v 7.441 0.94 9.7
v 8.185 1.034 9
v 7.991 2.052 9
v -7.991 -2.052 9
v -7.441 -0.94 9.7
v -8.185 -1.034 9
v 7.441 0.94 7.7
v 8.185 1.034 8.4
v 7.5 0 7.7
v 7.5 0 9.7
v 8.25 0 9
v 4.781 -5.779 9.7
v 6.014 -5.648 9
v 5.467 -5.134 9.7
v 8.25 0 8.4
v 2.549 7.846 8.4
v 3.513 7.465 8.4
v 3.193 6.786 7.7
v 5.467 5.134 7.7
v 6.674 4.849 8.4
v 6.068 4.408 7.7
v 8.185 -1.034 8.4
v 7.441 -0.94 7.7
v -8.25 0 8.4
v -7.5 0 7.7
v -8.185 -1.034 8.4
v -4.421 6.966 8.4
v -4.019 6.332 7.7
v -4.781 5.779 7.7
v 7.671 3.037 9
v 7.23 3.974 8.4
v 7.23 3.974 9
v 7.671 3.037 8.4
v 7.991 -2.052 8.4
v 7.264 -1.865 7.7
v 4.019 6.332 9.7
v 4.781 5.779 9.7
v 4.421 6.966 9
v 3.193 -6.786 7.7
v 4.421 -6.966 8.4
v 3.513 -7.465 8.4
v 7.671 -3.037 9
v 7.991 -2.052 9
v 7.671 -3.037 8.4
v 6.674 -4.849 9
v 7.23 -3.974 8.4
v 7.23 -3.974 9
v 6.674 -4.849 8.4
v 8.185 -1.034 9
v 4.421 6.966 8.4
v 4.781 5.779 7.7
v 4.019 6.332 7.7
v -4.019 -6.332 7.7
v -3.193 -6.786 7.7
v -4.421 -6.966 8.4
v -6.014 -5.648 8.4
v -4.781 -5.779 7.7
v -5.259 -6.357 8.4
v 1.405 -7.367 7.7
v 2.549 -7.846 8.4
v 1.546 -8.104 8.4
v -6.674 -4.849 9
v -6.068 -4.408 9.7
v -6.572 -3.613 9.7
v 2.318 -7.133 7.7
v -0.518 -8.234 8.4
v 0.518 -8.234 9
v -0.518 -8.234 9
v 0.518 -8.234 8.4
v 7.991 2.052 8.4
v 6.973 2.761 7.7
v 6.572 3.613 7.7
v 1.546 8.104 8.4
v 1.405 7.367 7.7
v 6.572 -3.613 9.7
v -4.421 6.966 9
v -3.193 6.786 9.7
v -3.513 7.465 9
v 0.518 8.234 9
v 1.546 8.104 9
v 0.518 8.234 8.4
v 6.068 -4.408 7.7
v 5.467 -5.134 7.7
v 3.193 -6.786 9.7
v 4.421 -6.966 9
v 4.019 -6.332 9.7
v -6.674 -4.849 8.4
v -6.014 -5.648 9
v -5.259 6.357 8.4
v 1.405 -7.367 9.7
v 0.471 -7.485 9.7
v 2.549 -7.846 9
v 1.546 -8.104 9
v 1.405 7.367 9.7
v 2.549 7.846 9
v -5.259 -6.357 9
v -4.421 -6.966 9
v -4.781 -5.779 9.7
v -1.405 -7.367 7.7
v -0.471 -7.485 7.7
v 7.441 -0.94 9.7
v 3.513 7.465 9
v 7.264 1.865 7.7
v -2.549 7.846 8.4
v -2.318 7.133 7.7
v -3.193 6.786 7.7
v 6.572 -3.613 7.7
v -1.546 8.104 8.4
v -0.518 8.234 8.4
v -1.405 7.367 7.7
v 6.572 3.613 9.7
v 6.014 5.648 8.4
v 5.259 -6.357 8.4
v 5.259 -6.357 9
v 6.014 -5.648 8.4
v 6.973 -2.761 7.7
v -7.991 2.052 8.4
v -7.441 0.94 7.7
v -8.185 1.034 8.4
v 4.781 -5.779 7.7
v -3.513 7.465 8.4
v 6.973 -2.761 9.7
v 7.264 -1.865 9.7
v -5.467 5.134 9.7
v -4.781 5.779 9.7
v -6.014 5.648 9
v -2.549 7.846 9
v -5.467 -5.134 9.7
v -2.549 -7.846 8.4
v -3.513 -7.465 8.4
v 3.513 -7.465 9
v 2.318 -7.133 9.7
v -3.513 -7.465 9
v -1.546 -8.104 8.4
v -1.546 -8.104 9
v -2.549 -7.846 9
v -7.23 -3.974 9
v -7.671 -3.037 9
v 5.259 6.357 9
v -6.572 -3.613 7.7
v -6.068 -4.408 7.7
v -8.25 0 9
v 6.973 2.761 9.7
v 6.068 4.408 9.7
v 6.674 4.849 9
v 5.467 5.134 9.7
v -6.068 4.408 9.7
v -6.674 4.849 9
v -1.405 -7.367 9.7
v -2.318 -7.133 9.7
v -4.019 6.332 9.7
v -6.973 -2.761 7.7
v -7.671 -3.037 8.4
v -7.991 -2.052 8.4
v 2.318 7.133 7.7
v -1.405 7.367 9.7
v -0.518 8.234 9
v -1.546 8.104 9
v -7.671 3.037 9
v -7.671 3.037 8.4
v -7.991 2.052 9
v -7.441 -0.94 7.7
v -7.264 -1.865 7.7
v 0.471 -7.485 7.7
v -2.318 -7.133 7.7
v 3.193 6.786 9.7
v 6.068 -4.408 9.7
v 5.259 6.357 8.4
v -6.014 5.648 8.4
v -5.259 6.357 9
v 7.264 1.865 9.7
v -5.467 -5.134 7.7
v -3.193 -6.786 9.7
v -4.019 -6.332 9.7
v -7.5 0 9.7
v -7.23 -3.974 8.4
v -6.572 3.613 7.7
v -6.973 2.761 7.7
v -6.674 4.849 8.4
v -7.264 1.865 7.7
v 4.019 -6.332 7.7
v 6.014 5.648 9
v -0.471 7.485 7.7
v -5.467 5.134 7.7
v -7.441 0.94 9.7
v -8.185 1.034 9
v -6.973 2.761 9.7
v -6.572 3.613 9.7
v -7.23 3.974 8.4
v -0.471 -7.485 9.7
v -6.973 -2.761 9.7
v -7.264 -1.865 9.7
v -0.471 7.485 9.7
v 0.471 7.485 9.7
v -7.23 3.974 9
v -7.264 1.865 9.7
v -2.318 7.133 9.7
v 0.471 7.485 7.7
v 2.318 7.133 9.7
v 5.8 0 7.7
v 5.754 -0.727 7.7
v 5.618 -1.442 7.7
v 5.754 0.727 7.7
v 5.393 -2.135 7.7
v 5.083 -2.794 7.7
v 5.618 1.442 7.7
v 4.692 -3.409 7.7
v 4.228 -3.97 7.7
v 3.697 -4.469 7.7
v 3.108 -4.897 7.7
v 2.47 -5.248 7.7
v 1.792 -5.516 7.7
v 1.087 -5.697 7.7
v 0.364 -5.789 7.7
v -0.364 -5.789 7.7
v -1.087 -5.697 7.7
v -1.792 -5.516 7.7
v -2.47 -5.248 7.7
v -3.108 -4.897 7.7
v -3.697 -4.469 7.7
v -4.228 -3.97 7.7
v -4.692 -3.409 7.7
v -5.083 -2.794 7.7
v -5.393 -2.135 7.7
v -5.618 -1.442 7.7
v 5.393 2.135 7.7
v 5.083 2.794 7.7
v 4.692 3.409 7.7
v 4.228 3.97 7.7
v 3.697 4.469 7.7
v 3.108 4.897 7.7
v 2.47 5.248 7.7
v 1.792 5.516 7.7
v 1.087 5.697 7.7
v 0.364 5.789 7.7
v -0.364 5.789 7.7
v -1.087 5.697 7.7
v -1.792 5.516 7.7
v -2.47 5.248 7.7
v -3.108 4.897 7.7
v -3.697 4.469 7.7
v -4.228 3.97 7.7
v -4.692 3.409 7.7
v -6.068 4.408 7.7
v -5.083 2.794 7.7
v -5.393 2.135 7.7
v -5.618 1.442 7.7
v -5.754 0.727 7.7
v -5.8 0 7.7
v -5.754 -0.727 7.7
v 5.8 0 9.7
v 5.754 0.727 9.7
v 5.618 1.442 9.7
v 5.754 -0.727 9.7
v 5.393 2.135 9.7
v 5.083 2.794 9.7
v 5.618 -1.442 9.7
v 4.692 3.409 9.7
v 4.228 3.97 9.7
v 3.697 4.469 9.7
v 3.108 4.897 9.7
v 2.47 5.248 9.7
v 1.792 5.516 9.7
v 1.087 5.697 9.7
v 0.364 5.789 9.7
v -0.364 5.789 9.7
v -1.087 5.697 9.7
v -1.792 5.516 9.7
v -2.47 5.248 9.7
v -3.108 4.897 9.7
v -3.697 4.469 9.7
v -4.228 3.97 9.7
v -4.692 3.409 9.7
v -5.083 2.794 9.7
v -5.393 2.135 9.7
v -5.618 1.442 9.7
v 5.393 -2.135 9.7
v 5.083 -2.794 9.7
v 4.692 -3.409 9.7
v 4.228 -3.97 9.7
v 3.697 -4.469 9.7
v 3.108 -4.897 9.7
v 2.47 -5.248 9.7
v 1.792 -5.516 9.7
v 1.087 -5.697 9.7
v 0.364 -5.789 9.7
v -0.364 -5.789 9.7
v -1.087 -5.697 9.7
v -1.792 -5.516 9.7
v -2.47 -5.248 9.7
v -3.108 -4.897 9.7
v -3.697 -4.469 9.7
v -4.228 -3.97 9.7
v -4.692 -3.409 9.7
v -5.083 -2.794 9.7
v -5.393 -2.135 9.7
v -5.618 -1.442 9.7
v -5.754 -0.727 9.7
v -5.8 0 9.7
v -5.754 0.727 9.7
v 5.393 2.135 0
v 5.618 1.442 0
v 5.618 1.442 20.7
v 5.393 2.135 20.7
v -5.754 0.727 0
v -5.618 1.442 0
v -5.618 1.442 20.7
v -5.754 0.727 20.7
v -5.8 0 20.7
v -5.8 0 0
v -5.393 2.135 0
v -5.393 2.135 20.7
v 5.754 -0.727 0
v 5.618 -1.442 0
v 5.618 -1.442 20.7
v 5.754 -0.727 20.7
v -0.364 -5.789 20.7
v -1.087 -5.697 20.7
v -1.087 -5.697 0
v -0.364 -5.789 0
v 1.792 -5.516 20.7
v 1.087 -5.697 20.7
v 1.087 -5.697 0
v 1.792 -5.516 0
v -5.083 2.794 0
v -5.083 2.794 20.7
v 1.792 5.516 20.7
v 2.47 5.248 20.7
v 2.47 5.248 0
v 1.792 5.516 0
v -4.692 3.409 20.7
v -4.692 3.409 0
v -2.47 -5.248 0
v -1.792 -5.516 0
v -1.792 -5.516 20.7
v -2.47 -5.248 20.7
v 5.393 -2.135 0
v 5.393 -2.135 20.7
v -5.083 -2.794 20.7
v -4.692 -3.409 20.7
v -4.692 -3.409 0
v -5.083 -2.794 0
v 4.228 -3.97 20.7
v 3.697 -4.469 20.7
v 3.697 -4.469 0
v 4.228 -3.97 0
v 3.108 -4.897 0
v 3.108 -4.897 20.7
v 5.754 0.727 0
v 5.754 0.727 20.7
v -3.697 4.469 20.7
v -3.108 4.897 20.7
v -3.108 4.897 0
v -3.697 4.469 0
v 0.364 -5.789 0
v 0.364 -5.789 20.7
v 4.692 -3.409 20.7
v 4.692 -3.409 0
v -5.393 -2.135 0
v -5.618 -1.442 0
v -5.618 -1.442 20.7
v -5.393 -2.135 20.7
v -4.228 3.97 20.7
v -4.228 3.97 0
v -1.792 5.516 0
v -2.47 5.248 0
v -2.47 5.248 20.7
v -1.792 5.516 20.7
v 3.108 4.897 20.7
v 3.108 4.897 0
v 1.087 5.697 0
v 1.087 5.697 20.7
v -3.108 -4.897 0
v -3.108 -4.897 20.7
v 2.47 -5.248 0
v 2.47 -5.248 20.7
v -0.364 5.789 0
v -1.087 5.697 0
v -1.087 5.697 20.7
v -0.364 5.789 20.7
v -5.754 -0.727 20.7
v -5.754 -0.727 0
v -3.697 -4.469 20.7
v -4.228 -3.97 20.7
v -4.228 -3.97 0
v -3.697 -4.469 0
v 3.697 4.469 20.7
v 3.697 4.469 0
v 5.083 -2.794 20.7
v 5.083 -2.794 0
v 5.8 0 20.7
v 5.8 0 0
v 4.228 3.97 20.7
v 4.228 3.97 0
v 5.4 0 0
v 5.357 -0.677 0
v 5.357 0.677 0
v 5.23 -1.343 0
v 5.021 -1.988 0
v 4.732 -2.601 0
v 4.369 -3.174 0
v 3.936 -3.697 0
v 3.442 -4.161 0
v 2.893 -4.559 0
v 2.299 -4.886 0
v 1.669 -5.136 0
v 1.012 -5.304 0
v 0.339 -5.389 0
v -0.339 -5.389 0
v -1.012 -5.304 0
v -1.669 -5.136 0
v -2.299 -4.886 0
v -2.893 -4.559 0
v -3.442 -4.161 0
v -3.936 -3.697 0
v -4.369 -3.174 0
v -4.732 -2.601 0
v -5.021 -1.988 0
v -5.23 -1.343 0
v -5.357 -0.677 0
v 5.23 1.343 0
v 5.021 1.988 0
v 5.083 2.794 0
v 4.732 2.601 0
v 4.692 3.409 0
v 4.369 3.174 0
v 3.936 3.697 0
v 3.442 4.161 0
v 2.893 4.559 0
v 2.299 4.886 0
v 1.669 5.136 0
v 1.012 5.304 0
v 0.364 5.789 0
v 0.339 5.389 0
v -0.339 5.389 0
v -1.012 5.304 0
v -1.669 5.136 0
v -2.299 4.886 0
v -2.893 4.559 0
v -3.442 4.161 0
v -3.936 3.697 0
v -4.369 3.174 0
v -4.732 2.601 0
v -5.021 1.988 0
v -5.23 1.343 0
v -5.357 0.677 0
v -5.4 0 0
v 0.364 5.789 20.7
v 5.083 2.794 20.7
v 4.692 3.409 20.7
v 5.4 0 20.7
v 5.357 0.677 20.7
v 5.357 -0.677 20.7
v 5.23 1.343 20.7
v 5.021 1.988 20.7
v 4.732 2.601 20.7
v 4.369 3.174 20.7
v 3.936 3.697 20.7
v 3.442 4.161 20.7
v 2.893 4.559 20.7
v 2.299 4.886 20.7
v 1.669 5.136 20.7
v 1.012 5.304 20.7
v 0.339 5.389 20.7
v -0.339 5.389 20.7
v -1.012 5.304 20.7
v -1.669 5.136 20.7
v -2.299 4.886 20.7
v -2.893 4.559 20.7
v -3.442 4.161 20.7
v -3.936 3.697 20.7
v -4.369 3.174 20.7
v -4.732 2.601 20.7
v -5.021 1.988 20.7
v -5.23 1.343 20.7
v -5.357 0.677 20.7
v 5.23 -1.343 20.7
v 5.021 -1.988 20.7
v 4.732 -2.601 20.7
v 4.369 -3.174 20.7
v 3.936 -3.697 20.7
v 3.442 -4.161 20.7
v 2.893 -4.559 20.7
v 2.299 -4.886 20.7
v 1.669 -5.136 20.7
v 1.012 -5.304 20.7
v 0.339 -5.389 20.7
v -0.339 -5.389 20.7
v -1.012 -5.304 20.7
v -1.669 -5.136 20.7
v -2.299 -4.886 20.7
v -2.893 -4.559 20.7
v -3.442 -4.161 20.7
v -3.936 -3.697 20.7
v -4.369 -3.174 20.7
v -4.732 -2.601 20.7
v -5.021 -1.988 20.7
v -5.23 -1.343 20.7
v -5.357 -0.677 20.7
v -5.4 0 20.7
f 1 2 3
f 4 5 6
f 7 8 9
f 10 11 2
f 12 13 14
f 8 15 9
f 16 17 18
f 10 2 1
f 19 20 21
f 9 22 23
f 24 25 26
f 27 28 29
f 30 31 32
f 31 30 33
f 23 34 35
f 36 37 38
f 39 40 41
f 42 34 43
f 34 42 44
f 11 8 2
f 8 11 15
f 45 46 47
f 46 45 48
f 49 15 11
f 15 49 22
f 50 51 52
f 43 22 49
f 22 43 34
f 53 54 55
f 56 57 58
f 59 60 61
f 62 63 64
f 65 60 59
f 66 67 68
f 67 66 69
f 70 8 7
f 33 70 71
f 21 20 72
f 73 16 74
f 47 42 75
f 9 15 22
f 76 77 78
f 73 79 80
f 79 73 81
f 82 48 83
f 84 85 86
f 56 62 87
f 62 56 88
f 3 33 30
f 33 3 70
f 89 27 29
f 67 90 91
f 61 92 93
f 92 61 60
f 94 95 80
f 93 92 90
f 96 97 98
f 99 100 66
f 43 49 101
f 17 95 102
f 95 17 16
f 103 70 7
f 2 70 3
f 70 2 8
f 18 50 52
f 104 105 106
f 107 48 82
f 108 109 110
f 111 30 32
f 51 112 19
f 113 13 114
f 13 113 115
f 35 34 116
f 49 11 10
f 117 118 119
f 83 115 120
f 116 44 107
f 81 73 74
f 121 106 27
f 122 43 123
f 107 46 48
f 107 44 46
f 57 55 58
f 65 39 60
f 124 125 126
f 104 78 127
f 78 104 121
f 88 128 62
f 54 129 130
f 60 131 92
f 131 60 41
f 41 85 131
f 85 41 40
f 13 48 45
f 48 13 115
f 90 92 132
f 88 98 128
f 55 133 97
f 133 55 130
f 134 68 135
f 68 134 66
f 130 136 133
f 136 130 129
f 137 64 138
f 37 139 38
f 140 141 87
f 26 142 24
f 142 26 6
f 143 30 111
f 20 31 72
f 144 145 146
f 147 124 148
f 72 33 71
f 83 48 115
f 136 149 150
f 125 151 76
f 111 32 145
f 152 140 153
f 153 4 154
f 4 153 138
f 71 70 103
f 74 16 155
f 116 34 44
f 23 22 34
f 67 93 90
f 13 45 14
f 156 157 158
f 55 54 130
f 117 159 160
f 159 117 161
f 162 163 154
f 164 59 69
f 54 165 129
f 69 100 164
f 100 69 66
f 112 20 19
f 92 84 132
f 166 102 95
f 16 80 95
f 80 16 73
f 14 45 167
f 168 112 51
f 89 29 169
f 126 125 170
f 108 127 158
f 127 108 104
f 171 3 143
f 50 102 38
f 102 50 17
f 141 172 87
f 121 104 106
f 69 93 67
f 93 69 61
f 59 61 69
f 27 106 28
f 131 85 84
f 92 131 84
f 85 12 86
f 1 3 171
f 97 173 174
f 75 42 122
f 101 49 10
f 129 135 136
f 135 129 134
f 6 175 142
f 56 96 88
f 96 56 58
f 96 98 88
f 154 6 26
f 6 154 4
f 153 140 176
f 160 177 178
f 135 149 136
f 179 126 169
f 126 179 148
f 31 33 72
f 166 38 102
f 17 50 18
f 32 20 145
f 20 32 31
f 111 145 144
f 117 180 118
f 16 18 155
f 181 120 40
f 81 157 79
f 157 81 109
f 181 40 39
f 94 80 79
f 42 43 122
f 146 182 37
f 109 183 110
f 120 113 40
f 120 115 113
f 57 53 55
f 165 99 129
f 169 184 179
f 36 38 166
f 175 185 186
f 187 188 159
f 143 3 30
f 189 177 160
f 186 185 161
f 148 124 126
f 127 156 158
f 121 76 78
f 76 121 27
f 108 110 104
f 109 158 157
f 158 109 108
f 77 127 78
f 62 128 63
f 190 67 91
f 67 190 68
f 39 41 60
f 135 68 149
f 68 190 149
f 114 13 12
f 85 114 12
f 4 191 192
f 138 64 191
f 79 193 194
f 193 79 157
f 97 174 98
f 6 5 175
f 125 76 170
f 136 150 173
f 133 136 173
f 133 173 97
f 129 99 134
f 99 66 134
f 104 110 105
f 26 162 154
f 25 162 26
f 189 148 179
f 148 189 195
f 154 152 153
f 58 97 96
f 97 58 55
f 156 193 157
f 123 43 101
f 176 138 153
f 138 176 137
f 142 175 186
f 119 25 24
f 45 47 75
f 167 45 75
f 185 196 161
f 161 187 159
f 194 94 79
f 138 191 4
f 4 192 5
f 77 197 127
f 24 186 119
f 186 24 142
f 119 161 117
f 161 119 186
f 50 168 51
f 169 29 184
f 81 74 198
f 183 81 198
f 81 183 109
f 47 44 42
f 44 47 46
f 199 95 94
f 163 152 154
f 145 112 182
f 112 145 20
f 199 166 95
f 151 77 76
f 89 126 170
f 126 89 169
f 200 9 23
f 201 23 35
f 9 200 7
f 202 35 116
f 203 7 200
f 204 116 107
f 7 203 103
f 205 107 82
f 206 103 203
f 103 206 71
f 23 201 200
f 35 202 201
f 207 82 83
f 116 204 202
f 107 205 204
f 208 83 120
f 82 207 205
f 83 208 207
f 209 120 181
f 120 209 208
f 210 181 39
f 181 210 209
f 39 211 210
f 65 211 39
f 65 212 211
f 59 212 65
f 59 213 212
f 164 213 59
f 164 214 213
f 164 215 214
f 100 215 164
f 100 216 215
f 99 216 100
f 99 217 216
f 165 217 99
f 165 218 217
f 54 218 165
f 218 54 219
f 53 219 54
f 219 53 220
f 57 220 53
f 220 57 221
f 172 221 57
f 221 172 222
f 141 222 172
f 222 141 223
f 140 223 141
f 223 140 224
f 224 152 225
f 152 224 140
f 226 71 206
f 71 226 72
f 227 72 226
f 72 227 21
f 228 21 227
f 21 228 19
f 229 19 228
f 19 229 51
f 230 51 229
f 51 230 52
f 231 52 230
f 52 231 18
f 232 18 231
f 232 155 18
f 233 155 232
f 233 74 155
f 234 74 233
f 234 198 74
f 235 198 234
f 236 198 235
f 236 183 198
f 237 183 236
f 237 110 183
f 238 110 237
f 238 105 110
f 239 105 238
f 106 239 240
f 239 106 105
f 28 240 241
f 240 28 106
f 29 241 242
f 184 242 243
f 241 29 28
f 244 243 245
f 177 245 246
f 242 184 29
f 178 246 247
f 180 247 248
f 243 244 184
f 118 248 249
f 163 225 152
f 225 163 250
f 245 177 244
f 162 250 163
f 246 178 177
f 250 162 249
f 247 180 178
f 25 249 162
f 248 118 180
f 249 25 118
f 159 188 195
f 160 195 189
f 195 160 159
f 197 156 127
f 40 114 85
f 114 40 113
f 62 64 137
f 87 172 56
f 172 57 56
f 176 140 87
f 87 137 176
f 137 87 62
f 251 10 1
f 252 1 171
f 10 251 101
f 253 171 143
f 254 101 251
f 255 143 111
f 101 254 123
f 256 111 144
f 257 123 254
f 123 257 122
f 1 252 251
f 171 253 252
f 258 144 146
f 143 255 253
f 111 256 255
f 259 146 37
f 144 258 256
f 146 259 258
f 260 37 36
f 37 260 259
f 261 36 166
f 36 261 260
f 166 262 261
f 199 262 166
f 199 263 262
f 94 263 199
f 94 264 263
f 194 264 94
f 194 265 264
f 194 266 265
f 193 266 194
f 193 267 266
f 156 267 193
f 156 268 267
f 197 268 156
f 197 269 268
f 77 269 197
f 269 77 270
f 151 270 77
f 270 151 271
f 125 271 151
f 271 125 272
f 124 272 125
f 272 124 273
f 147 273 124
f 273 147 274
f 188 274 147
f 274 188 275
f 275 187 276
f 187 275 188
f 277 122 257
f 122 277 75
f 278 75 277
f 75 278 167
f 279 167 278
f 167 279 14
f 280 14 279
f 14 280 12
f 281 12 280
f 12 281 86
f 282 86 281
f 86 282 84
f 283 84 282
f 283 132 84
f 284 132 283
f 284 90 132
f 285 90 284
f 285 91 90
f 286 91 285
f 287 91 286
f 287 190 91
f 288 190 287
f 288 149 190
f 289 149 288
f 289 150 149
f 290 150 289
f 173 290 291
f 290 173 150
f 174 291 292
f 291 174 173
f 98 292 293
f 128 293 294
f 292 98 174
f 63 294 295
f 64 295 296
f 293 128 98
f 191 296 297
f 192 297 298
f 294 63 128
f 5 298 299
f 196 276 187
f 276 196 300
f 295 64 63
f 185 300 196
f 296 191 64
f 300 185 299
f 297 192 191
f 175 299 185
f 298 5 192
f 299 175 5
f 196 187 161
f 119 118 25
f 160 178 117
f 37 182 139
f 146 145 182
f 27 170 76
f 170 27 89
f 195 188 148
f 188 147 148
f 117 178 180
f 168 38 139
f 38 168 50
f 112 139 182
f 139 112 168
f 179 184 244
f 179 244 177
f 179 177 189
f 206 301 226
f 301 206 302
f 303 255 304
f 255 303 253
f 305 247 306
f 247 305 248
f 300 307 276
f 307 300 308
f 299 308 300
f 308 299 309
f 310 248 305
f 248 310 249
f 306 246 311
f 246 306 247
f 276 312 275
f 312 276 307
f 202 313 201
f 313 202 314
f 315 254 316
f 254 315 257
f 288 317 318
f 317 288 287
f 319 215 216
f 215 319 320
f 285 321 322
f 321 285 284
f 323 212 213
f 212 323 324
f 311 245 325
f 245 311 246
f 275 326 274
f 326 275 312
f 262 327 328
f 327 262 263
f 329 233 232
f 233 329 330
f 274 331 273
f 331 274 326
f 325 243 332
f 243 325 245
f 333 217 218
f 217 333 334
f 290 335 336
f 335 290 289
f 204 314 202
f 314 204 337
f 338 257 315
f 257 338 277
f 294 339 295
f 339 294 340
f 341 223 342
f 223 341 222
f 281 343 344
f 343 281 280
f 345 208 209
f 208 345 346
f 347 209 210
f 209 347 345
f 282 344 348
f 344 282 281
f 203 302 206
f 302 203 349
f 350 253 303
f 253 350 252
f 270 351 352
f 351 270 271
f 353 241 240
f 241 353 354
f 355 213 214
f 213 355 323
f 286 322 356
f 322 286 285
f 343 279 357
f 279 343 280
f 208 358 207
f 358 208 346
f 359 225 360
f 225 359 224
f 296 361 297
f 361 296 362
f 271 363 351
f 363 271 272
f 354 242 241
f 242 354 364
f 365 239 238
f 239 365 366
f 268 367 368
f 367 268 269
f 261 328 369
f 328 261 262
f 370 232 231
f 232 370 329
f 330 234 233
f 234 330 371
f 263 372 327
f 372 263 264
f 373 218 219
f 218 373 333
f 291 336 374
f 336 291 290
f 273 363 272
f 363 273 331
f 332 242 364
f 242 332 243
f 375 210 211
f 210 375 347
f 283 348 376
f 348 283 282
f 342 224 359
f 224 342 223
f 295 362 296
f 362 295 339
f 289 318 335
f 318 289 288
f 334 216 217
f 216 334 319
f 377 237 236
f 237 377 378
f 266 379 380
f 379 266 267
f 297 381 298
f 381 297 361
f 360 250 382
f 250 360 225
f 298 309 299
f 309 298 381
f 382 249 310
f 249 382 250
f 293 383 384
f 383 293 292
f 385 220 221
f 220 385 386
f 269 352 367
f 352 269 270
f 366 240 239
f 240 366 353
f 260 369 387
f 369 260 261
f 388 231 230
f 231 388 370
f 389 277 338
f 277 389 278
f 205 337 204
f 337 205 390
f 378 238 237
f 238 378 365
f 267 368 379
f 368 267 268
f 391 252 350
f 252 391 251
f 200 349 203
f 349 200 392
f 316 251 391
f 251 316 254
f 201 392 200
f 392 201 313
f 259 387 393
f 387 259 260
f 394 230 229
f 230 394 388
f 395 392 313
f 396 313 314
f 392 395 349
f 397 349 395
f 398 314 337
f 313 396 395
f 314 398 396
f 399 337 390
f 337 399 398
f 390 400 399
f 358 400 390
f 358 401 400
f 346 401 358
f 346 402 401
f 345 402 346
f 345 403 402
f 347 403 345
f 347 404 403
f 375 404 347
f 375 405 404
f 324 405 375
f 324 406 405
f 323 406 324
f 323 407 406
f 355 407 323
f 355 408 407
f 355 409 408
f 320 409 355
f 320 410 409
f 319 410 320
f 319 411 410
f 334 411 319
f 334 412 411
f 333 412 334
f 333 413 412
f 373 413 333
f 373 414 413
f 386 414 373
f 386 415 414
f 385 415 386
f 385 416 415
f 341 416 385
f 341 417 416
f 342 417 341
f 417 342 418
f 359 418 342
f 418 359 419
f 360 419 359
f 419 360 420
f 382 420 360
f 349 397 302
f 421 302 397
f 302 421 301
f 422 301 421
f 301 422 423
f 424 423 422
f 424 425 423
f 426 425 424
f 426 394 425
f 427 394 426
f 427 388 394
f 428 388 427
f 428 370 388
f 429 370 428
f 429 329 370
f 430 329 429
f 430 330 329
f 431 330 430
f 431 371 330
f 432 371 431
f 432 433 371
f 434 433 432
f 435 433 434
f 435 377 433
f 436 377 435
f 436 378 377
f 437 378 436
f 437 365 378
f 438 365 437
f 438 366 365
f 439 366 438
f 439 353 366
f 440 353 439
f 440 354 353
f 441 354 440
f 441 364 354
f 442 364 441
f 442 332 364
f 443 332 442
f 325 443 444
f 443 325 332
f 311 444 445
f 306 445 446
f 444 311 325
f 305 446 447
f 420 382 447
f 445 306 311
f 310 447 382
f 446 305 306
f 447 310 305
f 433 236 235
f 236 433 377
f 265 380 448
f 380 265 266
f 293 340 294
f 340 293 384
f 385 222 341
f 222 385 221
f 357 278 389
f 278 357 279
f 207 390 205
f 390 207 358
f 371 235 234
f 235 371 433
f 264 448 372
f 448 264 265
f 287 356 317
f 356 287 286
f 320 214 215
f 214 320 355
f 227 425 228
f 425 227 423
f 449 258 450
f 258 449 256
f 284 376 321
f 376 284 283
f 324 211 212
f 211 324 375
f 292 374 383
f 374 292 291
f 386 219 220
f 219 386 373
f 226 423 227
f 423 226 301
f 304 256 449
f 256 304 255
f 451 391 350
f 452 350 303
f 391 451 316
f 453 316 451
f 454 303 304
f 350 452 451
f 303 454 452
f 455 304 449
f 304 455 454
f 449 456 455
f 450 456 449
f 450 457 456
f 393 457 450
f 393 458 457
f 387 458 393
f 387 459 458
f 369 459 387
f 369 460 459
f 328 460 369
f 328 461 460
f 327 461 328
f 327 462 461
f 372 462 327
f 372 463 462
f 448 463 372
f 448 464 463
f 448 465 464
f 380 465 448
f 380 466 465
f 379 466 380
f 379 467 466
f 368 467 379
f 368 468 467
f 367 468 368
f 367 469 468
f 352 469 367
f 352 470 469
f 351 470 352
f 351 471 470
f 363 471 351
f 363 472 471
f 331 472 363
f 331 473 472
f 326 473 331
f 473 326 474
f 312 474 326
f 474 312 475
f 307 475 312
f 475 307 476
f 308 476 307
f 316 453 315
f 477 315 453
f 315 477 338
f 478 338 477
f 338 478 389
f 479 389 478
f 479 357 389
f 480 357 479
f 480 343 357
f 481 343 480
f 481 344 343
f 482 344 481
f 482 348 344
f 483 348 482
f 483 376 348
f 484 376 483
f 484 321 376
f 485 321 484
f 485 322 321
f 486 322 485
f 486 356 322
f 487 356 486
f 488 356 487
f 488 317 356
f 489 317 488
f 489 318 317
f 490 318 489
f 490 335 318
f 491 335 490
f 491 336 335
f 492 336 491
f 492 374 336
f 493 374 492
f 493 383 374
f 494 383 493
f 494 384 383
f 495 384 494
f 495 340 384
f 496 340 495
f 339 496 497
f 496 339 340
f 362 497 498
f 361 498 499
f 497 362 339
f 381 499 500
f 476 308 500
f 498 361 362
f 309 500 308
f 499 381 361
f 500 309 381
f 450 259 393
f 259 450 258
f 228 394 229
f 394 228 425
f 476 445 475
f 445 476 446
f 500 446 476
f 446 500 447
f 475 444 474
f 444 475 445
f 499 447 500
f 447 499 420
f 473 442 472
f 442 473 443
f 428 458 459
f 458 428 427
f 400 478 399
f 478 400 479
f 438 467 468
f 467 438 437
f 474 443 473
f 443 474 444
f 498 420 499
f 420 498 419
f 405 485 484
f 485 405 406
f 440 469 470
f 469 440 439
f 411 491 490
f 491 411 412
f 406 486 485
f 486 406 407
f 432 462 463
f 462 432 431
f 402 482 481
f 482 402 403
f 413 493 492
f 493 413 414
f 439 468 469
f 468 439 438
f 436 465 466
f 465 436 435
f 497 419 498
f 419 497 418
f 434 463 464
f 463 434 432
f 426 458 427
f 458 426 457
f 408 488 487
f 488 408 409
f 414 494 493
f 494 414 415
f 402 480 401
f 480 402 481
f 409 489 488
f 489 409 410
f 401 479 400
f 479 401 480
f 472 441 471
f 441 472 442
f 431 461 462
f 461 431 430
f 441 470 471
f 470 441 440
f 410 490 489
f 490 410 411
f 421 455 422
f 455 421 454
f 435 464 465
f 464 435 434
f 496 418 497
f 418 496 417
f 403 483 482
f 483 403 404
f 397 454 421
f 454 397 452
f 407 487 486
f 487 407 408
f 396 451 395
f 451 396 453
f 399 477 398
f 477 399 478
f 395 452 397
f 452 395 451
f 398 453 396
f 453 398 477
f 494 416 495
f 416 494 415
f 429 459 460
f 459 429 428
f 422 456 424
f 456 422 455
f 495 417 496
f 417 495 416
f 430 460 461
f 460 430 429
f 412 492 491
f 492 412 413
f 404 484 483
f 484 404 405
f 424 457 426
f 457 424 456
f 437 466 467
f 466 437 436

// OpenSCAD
// plotter pen adapter for Sharpie Fine Point markers
// created January, 2014 by Brian Boucheron <brian@boucheron.org>

band_full_thickness = 2;    // thickest point of the band
band_edge_thickness = 0.6;  // thinnest point of the band
band_full_diameter = 16.5;  // diameter at widest point of band
band_edge_diameter = 15;    // diameter where band starts to angle in


// sharpie outer diameter measured at 10.64mm
// plotter outer diameter measured at 11.50mm
body_outer_diameter = 11.6; // outer diameter of the main body
body_inner_diameter = 10.8; // inner diameter of the main body

profile = [
    [0,0],
    [band_edge_diameter / 2, 0],
    [band_full_diameter / 2, (band_full_thickness - band_edge_thickness) / 2],
    [band_full_diameter / 2, band_full_thickness - ((band_full_thickness - band_edge_thickness) / 2)],
    [band_edge_diameter / 2, band_full_thickness],
    [0,band_full_thickness],
    // end body
];

translate([0,0,37])
rotate(a=[0,180,0]){

    difference() {

        union() {
            translate([0,0,27.3])
            rotate_extrude($fn=50)
            polygon(points=profile);
            translate([0,0,27.3-11])
            cylinder(r=body_outer_diameter/2, h=20.7, $fn=50);
        }
        
        cylinder(r=body_inner_diameter/2, h=50, $fn=50);

    }
}
